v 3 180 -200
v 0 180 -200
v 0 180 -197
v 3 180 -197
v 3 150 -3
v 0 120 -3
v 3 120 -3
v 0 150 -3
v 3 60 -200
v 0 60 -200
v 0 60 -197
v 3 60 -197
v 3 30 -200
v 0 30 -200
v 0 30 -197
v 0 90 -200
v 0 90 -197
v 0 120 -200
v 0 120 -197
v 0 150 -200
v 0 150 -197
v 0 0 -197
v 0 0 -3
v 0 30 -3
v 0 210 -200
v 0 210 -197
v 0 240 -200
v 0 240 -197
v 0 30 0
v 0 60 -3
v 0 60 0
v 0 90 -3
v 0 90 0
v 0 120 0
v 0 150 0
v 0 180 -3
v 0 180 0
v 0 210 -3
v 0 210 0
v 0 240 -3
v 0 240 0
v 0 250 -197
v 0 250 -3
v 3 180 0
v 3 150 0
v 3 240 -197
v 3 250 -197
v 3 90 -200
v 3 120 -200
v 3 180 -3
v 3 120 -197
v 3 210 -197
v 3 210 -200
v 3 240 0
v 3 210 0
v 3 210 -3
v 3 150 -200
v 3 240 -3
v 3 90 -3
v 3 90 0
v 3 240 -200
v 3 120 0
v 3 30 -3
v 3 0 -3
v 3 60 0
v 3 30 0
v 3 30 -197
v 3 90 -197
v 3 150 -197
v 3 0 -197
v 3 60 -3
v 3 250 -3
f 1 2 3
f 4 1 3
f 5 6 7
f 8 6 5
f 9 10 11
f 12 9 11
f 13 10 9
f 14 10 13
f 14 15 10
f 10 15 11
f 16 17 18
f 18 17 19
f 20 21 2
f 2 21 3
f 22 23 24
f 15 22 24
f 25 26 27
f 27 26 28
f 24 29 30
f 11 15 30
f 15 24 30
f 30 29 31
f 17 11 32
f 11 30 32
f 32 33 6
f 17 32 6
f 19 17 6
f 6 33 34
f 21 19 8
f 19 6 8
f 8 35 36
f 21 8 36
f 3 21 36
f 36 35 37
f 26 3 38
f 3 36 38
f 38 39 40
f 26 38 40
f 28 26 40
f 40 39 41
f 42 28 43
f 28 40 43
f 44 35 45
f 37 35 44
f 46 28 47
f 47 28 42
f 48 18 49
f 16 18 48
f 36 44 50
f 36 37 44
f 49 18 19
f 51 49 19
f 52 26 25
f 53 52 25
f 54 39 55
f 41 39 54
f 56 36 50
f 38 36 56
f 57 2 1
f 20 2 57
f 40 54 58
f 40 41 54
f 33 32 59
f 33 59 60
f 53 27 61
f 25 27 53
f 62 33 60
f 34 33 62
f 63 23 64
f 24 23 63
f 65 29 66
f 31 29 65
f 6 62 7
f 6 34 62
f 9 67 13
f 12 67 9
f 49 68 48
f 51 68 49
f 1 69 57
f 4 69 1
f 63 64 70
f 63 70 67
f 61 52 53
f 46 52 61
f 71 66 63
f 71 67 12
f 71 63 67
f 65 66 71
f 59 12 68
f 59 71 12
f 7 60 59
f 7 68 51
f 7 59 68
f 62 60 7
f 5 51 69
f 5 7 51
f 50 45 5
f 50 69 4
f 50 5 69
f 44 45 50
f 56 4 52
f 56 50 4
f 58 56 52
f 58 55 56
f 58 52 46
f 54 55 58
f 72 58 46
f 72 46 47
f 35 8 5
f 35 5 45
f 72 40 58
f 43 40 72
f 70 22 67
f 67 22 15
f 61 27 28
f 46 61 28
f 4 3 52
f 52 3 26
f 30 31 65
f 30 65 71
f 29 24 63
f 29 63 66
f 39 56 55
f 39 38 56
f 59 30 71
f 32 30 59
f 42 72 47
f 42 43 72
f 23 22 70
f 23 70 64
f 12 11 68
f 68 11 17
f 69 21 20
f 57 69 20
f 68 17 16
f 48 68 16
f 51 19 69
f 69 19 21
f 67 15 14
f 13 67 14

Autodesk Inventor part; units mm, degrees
ref_plane "YZ Plane" through (0, 0, 0) normal (1, 0, 0) x (0, 1, 0)
ref_plane "XZ Plane" through (0, 0, 0) normal (0, 1, 0) x (-1, 0, 0)
ref_plane "XY Plane" through (0, 0, 0) normal (0, 0, 1) x (1, 0, 0)
sketch "Sketch2" plane through (0, 0, 0) normal (1, 0, 0) x (0, 1, 0)
  line L0 (250, 0) -> (250, -200)
  line L1 (250, -200) -> (0, -200)
  line L2 (0, -200) -> (0, 0)
  line L3 (0, 0) -> (0, -3)
  line L4 (0, -3) -> (30, -3)
  line L5 (30, -3) -> (30, 0)
  line L6 (30, 0) -> (60, 0)
  line L7 (60, 0) -> (60, -3)
  line L8 (60, -3) -> (90, -3)
  line L9 (90, -3) -> (90, 0)
  line L10 (90, 0) -> (120, 0)
  line L11 (120, 0) -> (120, -3)
  line L12 (120, -3) -> (150, -3)
  line L13 (150, -3) -> (150, 0)
  line L14 (150, 0) -> (180, 0)
  line L15 (180, 0) -> (180, -3)
  line L16 (180, -3) -> (210, -3)
  line L17 (210, -3) -> (210, 0)
  line L18 (210, 0) -> (240, 0)
  line L19 (240, 0) -> (240, -3)
  line L20 (240, -3) -> (250, -3)
  line L21 (0, -100) -> (250, -100)
  line L22 (0, -197) -> (30, -197)
  line L23 (30, -197) -> (30, -200)
  line L24 (30, -200) -> (60, -200)
  line L25 (60, -200) -> (60, -197)
  line L26 (60, -197) -> (90, -197)
  line L27 (90, -197) -> (90, -200)
  line L28 (90, -200) -> (120, -200)
  line L29 (120, -200) -> (120, -197)
  line L30 (120, -197) -> (150, -197)
  line L31 (150, -197) -> (150, -200)
  line L32 (150, -200) -> (180, -200)
  line L33 (180, -200) -> (180, -197)
  line L34 (180, -197) -> (210, -197)
  line L35 (210, -197) -> (210, -200)
  line L36 (210, -200) -> (240, -200)
  line L37 (240, -200) -> (240, -197)
  line L38 (240, -197) -> (250, -197)
  dimension "d44" = 200
  dimension "d45" = 250
  dimension "d46" = 3
  dimension "d47" = 30
  dimension "d48" = 3
  dimension "d49" = 30
  dimension "d50" = 3
  dimension "d51" = 30
  dimension "d52" = 3
  dimension "d53" = 30
  dimension "d54" = 3
  dimension "d55" = 30
  dimension "d56" = 3
  dimension "d57" = 30
  dimension "d58" = 3
  dimension "d59" = 30
  dimension "d60" = 3
  dimension "d61" = 30
  dimension "d62" = 3
  dimension "d63" = 10
  dimension "d64" = 90
extrude "Extrusion2" add sketch "Sketch2" along normal blind 3 contours L0 L21 L2 L4 L5 L6 L7 L8 L9 L10 L11 L12 L13 L14 L15 L16 L17 L18 L19 L20 | L0 L38 L37 L1 L35 L34 L33 L31 L30 L29 L27 L26 L25 L23 L22 L2 L21
properties part number "Q side 2" material "ABS Plastic"
